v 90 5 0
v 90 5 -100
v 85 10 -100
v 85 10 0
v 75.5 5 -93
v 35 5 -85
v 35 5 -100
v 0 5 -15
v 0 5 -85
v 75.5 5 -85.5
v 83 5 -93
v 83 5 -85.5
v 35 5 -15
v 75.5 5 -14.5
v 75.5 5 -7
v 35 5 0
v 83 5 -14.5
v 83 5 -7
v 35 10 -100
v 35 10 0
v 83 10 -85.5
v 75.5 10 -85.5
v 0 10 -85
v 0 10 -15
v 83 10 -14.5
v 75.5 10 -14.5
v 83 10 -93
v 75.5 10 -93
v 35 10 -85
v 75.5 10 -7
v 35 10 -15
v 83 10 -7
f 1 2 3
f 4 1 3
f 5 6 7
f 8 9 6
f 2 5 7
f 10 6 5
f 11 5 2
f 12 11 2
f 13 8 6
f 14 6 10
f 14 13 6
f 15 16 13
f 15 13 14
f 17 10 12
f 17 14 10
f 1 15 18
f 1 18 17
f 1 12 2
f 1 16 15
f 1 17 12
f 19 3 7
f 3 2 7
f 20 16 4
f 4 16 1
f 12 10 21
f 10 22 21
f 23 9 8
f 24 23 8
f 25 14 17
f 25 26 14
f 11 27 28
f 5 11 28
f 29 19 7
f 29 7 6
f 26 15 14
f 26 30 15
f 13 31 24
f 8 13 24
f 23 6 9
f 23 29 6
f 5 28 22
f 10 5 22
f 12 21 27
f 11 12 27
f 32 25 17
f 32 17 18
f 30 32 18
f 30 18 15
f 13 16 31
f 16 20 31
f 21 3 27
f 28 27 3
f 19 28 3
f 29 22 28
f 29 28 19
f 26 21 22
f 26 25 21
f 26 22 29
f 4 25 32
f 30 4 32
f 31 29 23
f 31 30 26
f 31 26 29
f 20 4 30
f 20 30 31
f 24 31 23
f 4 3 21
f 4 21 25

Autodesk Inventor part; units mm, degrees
ref_plane "YZ Plane" through (0, 0, 0) normal (1, 0, 0) x (0, 1, 0)
ref_plane "XZ Plane" through (0, 0, 0) normal (0, 1, 0) x (-1, 0, 0)
ref_plane "XY Plane" through (0, 0, 0) normal (0, 0, 1) x (1, 0, 0)
sketch "Szkic1" plane through (0, 0, 0) normal (0, 1, 0) x (-1, 0, 0)
  line L0 (0, 0) -> (-100, 0)
  line L1 (-100, 0) -> (-100, -100)
  line L2 (-100, -100) -> (0, -100)
  line L3 (0, -100) -> (0, 0)
  dimension "d0" = 100
  dimension "d1" = 100
extrude "Wyciągnięcie proste1" add sketch "Szkic1" along normal blind 10
sketch "Szkic2" plane through (100, 0, -100) normal (0, 0, -1) x (-1, 0, 0)
  line L0 (0, 0) -> (5, 0)
  line L1 (5, 0) -> (15, 10)
  line L2 (0, 10) -> (100, 10) projected
  line L3 (5, 0) -> (19.1421, 0) construction
  line L4 (15, 10) -> (0, 10)
  line L5 (0, 10) -> (0, 0.5914)
  line L6 (0, 0) -> (100, 0) projected
  line L7 (0, 0.5914) -> (0, 0)
  line L8 (0, 0) -> (5, 0)
  dimension "d4" = 5
  dimension "d5" = 45
extrude "Wyciągnięcie proste2" cut sketch "Szkic2" against normal blind 100
sketch "Szkic4" plane through (0, 0, 0) normal (0, 0, 1) x (1, 0, 0)
  line L0 (0, 0) -> (100, 0)
  line L1 (100, 0) -> (100, 2)
  line L2 (100, 2) -> (0, 2)
  line L3 (0, 2) -> (0, 0)
  dimension "d8" = 100
  dimension "d9" = 2
extrude "Wyciągnięcie proste3" cut sketch "Szkic4" against normal blind 100
sketch "Szkic5" plane through (0, 10, 0) normal (0, 1, 0) x (1, 0, 0)
  line L0 (0, 0) -> (85, 0) projected
  line L1 (0, 0) -> (35, 0)
  line L2 (35, 0) -> (35, 15)
  line L3 (35, 15) -> (0, 15)
  line L4 (0, 15) -> (0, 0)
  line L5 (0, 100) -> (0, 0) projected
  line L6 (0, 100) -> (35, 100)
  line L7 (35, 100) -> (35, 85)
  line L8 (35, 85) -> (0, 85)
  line L9 (0, 85) -> (0, 100)
  dimension "d12" = 35
  dimension "d13" = 15
  dimension "d14" = 35
  dimension "d15" = 15
extrude "Wyciągnięcie proste4" cut sketch "Szkic5" against normal blind 100 contours L5 L6 L7 L8
sketch "Szkic6" plane through (0, 10, 0) normal (0, 1, 0) x (1, 0, 0)
  line L0 (0, 0) -> (93, 0) projected
  line L1 (0, 0) -> (35, 0)
  line L2 (35, 0) -> (35, 15)
  line L3 (35, 15) -> (0, 15)
  line L4 (0, 15) -> (0, 0)
  dimension "d18" = 35
  dimension "d19" = 15
extrude "Wyciągnięcie proste5" cut sketch "Szkic6" against normal blind 100
sketch "Szkic7" plane through (35, 2, 0) normal (0, 0, 1) x (1, 0, 0)
  line L0 (58, 0) -> (50, 8) projected
  line L1 (58, 0) -> (-42, 0)
  line L2 (-42, 0) -> (-42, 2)
  line L3 (-42, 2) -> (58, 2)
  line L4 (58, 2) -> (58, 0)
  point P0 (-35, -2)
  point P1 (56, 2)
  dimension "d22" = 100
  dimension "d23" = 2
extrude "Wyciągnięcie proste6" cut sketch "Szkic7" against normal blind 101.5 contours L1 L2 L3 L0
sketch "Szkic8" plane through (0, 10, 0) normal (0, 1, 0) x (1, 0, 0)
  line L0 (83, 93) -> (75.5, 93)
  line L1 (75.5, 93) -> (75.5, 85.5)
  line L2 (75.5, 85.5) -> (83, 85.5)
  line L3 (83, 85.5) -> (83, 93)
  point P0 (0, 0)
  dimension "d26" = 7.5
  dimension "d27" = 7.5
extrude "Wyciągnięcie proste7" cut sketch "Szkic8" against normal blind 10
sketch "Szkic9" plane through (0, 10, 0) normal (0, 1, 0) x (1, 0, 0)
  line L0 (83, 7) -> (75.5, 7)
  line L1 (75.5, 7) -> (75.5, 14.5)
  line L2 (75.5, 14.5) -> (83, 14.5)
  line L3 (83, 14.5) -> (83, 7)
  point P0 (0, 0)
  dimension "d30" = 7.5
  dimension "d31" = 7.5
extrude "Wyciągnięcie proste8" cut sketch "Szkic9" against normal blind 10
sketch "Szkic11" plane through (35, 10, 0) normal (0, 0, 1) x (1, 0, 0)
  line L0 (0, -6) -> (56, -6) projected
  line L1 (-35, 0) -> (-35, -6) projected
  line L2 (56, -6) -> (-35, -6)
  line L3 (-35, -6) -> (-35, -5)
  line L4 (-35, -5) -> (56, -5)
  line L5 (56, -5) -> (56, -6)
  point P0 (-35, -10)
  dimension "d34" = 1
extrude "Wyciągnięcie proste9" cut sketch "Szkic11" against normal blind 100.75
properties part number "Helenowiak_podstawa"
